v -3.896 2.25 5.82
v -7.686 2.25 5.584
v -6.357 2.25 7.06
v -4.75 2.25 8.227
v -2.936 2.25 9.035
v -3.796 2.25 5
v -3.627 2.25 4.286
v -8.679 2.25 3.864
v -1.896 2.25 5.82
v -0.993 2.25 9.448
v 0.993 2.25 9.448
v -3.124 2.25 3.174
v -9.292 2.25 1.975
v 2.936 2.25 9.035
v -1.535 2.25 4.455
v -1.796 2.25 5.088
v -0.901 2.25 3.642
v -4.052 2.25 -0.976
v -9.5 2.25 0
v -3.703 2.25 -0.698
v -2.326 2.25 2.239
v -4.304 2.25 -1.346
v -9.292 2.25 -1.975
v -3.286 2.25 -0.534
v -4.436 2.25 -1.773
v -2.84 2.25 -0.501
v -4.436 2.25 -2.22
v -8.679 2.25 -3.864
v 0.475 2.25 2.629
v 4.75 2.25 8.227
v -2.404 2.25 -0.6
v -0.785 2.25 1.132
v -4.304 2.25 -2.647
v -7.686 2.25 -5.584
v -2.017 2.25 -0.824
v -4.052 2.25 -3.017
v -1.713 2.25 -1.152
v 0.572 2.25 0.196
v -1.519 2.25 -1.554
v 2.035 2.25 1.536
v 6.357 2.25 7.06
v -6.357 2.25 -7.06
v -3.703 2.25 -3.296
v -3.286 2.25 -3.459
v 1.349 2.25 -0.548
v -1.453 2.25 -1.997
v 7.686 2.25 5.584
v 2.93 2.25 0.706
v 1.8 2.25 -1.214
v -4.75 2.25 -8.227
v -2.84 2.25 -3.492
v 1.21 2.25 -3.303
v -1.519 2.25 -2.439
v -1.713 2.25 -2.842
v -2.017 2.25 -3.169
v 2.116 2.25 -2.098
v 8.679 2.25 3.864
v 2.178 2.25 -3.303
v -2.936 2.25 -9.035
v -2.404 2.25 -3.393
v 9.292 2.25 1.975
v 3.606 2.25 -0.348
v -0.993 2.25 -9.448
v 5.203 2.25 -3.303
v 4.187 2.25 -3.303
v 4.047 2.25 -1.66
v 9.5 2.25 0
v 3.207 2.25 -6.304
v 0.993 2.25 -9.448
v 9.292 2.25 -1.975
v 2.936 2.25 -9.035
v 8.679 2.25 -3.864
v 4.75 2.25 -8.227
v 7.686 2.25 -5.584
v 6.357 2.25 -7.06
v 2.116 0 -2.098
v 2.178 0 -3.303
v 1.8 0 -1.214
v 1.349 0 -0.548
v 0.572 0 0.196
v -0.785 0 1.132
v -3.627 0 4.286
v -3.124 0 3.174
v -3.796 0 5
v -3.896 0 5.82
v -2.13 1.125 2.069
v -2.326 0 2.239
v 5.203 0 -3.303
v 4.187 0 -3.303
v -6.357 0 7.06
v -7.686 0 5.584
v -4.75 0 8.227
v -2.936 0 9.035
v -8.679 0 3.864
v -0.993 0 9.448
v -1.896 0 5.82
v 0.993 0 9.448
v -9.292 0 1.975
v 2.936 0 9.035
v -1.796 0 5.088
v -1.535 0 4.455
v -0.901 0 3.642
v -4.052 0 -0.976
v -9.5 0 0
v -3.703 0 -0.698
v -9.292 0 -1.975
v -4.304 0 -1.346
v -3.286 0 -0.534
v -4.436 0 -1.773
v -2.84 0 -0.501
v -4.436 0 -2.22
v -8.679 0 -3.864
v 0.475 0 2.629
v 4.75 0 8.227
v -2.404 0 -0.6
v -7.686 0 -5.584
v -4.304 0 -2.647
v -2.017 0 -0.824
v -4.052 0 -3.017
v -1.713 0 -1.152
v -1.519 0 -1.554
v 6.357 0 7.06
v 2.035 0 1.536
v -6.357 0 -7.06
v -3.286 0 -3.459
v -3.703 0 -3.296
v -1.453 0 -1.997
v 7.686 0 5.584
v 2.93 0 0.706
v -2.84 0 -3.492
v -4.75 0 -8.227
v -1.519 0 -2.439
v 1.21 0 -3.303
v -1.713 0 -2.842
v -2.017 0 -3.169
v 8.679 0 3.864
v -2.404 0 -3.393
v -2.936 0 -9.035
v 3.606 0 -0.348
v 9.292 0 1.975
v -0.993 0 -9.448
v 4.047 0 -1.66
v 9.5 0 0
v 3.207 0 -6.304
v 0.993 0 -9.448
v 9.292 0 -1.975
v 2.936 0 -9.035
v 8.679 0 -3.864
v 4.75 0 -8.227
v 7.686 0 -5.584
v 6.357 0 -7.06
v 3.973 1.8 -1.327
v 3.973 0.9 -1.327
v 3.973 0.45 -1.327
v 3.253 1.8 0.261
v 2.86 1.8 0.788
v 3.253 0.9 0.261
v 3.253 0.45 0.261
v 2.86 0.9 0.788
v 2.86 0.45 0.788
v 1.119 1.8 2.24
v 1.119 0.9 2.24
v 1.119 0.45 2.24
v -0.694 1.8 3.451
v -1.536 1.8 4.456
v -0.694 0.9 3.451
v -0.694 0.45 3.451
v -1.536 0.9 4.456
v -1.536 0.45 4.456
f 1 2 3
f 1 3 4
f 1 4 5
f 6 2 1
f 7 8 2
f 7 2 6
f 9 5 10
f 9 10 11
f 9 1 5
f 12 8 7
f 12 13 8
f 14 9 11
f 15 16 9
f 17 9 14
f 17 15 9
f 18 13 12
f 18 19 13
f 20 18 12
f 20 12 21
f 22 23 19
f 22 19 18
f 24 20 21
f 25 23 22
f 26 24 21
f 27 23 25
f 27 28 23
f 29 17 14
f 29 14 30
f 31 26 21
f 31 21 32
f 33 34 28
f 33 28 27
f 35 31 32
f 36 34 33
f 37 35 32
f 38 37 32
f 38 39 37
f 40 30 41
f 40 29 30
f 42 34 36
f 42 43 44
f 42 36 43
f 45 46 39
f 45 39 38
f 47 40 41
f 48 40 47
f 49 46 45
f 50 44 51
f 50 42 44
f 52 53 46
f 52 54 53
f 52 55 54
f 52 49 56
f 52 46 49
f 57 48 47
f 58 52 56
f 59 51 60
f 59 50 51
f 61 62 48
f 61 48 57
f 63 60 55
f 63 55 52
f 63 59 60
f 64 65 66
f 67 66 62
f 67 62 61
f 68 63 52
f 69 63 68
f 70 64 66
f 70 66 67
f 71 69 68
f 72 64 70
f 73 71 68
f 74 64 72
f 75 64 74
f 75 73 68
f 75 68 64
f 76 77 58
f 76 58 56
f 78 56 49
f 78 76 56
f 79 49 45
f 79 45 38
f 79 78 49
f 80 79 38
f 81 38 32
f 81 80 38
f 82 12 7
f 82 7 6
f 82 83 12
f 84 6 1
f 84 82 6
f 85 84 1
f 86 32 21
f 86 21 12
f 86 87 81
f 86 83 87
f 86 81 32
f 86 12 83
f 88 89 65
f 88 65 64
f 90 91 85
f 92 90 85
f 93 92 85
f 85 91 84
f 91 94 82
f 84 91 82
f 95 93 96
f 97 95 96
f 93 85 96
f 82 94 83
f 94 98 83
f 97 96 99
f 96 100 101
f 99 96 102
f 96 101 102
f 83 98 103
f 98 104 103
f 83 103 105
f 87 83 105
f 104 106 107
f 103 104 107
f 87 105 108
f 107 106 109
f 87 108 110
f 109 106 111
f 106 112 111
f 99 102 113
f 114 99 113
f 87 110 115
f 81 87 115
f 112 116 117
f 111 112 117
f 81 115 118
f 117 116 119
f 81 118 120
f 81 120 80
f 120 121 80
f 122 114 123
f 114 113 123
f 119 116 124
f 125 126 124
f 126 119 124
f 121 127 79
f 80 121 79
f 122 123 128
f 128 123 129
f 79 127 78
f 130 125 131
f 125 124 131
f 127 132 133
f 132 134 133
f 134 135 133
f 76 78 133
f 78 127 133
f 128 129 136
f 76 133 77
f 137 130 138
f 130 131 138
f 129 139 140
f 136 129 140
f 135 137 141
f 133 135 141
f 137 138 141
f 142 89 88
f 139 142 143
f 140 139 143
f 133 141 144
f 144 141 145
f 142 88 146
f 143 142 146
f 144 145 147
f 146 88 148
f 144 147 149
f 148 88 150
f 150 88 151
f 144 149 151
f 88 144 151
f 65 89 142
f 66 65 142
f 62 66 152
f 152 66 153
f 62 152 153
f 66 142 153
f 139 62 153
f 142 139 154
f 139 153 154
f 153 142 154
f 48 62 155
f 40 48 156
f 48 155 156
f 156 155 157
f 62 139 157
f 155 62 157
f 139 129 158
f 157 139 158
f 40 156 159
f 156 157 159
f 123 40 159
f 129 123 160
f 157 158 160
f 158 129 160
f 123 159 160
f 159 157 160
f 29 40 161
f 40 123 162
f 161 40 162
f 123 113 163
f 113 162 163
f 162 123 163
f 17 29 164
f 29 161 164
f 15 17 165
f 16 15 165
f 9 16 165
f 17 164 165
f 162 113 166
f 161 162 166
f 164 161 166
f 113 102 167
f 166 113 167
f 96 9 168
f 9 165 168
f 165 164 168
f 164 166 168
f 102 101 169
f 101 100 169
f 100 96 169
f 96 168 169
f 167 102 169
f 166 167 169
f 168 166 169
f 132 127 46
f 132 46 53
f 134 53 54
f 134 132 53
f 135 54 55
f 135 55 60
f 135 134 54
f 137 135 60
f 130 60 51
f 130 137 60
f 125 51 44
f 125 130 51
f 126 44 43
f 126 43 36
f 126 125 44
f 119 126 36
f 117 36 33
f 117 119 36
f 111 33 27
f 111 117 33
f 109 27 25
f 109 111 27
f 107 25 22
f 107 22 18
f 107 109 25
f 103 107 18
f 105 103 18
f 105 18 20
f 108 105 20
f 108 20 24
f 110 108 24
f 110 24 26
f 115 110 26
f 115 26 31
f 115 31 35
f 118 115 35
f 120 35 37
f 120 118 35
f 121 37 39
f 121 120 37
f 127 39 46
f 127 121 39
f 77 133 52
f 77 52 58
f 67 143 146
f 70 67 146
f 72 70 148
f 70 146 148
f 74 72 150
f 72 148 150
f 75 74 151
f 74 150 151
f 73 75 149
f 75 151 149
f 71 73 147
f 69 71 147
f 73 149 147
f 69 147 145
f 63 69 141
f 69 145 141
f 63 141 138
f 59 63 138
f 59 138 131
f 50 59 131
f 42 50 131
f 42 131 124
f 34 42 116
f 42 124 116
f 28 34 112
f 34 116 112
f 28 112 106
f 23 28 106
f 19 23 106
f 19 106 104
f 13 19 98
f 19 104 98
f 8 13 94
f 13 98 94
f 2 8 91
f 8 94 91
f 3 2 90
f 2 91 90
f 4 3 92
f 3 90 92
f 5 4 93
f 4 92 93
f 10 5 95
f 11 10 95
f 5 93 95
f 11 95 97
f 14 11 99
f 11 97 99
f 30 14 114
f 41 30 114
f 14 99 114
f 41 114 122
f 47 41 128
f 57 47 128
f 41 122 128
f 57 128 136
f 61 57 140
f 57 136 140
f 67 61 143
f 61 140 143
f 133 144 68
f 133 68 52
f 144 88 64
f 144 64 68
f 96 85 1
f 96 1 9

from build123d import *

# Parameters (mm, degrees)
SKETCH1_R           = 9.5
SKETCH1_R_2         = 1.5
BOSS_EXTRUDE1_DEPTH = 2.25


with BuildPart() as part:
    # Sketch1 → Boss-Extrude1 (new body)
    with BuildSketch(Plane(origin=(0, 0, 0), x_dir=(1, 0, 0), z_dir=(0, 1, 0))):
        Circle(SKETCH1_R)
        with Locations((-2.952501305, 1.996568505)):
            Circle(SKETCH1_R_2, mode=Mode.SUBTRACT)
        with BuildLine():
            Line((1.210041518, 3.303413345), (2.178074733, 3.303413345))
            add(Edge.make_bspline(
                [(2.178074733, 3.303413345), (2.444856065, 0.149541279), (-2.085629529, -1.114991667), (-3.758110102, -3.954281272), (-3.896333689, -5.820299703)],
                knots=[0, 0, 0, 0, 0.63008416, 1, 1, 1, 1], degree=3))
            Line((-3.896333689, -5.820299703), (-1.896333689, -5.820299703))
            add(Edge.make_bspline(
                [(4.186743653, 3.303413345), (4.162331661, 1.716633845), (3.916646292, 0.656016278), (2.663767731, -1.102040856), (1.822435365, -1.678254748), (0.735292504, -2.593233031), (-1.88135337, -3.72928874), (-1.896333689, -5.820299703)],
                knots=[0, 0, 0, 0, 0.433164655, 0.505148227, 0.695981554, 0.747852148, 1, 1, 1, 1], degree=3))
            Line((4.186743653, 3.303413345), (5.203178529, 3.303413345))
            Line((5.203178529, 3.303413345), (3.206610024, 6.304316311))
            Line((3.206610024, 6.304316311), (1.210041518, 3.303413345))
        make_face(mode=Mode.SUBTRACT)
    extrude(amount=BOSS_EXTRUDE1_DEPTH)


solid = part.part
